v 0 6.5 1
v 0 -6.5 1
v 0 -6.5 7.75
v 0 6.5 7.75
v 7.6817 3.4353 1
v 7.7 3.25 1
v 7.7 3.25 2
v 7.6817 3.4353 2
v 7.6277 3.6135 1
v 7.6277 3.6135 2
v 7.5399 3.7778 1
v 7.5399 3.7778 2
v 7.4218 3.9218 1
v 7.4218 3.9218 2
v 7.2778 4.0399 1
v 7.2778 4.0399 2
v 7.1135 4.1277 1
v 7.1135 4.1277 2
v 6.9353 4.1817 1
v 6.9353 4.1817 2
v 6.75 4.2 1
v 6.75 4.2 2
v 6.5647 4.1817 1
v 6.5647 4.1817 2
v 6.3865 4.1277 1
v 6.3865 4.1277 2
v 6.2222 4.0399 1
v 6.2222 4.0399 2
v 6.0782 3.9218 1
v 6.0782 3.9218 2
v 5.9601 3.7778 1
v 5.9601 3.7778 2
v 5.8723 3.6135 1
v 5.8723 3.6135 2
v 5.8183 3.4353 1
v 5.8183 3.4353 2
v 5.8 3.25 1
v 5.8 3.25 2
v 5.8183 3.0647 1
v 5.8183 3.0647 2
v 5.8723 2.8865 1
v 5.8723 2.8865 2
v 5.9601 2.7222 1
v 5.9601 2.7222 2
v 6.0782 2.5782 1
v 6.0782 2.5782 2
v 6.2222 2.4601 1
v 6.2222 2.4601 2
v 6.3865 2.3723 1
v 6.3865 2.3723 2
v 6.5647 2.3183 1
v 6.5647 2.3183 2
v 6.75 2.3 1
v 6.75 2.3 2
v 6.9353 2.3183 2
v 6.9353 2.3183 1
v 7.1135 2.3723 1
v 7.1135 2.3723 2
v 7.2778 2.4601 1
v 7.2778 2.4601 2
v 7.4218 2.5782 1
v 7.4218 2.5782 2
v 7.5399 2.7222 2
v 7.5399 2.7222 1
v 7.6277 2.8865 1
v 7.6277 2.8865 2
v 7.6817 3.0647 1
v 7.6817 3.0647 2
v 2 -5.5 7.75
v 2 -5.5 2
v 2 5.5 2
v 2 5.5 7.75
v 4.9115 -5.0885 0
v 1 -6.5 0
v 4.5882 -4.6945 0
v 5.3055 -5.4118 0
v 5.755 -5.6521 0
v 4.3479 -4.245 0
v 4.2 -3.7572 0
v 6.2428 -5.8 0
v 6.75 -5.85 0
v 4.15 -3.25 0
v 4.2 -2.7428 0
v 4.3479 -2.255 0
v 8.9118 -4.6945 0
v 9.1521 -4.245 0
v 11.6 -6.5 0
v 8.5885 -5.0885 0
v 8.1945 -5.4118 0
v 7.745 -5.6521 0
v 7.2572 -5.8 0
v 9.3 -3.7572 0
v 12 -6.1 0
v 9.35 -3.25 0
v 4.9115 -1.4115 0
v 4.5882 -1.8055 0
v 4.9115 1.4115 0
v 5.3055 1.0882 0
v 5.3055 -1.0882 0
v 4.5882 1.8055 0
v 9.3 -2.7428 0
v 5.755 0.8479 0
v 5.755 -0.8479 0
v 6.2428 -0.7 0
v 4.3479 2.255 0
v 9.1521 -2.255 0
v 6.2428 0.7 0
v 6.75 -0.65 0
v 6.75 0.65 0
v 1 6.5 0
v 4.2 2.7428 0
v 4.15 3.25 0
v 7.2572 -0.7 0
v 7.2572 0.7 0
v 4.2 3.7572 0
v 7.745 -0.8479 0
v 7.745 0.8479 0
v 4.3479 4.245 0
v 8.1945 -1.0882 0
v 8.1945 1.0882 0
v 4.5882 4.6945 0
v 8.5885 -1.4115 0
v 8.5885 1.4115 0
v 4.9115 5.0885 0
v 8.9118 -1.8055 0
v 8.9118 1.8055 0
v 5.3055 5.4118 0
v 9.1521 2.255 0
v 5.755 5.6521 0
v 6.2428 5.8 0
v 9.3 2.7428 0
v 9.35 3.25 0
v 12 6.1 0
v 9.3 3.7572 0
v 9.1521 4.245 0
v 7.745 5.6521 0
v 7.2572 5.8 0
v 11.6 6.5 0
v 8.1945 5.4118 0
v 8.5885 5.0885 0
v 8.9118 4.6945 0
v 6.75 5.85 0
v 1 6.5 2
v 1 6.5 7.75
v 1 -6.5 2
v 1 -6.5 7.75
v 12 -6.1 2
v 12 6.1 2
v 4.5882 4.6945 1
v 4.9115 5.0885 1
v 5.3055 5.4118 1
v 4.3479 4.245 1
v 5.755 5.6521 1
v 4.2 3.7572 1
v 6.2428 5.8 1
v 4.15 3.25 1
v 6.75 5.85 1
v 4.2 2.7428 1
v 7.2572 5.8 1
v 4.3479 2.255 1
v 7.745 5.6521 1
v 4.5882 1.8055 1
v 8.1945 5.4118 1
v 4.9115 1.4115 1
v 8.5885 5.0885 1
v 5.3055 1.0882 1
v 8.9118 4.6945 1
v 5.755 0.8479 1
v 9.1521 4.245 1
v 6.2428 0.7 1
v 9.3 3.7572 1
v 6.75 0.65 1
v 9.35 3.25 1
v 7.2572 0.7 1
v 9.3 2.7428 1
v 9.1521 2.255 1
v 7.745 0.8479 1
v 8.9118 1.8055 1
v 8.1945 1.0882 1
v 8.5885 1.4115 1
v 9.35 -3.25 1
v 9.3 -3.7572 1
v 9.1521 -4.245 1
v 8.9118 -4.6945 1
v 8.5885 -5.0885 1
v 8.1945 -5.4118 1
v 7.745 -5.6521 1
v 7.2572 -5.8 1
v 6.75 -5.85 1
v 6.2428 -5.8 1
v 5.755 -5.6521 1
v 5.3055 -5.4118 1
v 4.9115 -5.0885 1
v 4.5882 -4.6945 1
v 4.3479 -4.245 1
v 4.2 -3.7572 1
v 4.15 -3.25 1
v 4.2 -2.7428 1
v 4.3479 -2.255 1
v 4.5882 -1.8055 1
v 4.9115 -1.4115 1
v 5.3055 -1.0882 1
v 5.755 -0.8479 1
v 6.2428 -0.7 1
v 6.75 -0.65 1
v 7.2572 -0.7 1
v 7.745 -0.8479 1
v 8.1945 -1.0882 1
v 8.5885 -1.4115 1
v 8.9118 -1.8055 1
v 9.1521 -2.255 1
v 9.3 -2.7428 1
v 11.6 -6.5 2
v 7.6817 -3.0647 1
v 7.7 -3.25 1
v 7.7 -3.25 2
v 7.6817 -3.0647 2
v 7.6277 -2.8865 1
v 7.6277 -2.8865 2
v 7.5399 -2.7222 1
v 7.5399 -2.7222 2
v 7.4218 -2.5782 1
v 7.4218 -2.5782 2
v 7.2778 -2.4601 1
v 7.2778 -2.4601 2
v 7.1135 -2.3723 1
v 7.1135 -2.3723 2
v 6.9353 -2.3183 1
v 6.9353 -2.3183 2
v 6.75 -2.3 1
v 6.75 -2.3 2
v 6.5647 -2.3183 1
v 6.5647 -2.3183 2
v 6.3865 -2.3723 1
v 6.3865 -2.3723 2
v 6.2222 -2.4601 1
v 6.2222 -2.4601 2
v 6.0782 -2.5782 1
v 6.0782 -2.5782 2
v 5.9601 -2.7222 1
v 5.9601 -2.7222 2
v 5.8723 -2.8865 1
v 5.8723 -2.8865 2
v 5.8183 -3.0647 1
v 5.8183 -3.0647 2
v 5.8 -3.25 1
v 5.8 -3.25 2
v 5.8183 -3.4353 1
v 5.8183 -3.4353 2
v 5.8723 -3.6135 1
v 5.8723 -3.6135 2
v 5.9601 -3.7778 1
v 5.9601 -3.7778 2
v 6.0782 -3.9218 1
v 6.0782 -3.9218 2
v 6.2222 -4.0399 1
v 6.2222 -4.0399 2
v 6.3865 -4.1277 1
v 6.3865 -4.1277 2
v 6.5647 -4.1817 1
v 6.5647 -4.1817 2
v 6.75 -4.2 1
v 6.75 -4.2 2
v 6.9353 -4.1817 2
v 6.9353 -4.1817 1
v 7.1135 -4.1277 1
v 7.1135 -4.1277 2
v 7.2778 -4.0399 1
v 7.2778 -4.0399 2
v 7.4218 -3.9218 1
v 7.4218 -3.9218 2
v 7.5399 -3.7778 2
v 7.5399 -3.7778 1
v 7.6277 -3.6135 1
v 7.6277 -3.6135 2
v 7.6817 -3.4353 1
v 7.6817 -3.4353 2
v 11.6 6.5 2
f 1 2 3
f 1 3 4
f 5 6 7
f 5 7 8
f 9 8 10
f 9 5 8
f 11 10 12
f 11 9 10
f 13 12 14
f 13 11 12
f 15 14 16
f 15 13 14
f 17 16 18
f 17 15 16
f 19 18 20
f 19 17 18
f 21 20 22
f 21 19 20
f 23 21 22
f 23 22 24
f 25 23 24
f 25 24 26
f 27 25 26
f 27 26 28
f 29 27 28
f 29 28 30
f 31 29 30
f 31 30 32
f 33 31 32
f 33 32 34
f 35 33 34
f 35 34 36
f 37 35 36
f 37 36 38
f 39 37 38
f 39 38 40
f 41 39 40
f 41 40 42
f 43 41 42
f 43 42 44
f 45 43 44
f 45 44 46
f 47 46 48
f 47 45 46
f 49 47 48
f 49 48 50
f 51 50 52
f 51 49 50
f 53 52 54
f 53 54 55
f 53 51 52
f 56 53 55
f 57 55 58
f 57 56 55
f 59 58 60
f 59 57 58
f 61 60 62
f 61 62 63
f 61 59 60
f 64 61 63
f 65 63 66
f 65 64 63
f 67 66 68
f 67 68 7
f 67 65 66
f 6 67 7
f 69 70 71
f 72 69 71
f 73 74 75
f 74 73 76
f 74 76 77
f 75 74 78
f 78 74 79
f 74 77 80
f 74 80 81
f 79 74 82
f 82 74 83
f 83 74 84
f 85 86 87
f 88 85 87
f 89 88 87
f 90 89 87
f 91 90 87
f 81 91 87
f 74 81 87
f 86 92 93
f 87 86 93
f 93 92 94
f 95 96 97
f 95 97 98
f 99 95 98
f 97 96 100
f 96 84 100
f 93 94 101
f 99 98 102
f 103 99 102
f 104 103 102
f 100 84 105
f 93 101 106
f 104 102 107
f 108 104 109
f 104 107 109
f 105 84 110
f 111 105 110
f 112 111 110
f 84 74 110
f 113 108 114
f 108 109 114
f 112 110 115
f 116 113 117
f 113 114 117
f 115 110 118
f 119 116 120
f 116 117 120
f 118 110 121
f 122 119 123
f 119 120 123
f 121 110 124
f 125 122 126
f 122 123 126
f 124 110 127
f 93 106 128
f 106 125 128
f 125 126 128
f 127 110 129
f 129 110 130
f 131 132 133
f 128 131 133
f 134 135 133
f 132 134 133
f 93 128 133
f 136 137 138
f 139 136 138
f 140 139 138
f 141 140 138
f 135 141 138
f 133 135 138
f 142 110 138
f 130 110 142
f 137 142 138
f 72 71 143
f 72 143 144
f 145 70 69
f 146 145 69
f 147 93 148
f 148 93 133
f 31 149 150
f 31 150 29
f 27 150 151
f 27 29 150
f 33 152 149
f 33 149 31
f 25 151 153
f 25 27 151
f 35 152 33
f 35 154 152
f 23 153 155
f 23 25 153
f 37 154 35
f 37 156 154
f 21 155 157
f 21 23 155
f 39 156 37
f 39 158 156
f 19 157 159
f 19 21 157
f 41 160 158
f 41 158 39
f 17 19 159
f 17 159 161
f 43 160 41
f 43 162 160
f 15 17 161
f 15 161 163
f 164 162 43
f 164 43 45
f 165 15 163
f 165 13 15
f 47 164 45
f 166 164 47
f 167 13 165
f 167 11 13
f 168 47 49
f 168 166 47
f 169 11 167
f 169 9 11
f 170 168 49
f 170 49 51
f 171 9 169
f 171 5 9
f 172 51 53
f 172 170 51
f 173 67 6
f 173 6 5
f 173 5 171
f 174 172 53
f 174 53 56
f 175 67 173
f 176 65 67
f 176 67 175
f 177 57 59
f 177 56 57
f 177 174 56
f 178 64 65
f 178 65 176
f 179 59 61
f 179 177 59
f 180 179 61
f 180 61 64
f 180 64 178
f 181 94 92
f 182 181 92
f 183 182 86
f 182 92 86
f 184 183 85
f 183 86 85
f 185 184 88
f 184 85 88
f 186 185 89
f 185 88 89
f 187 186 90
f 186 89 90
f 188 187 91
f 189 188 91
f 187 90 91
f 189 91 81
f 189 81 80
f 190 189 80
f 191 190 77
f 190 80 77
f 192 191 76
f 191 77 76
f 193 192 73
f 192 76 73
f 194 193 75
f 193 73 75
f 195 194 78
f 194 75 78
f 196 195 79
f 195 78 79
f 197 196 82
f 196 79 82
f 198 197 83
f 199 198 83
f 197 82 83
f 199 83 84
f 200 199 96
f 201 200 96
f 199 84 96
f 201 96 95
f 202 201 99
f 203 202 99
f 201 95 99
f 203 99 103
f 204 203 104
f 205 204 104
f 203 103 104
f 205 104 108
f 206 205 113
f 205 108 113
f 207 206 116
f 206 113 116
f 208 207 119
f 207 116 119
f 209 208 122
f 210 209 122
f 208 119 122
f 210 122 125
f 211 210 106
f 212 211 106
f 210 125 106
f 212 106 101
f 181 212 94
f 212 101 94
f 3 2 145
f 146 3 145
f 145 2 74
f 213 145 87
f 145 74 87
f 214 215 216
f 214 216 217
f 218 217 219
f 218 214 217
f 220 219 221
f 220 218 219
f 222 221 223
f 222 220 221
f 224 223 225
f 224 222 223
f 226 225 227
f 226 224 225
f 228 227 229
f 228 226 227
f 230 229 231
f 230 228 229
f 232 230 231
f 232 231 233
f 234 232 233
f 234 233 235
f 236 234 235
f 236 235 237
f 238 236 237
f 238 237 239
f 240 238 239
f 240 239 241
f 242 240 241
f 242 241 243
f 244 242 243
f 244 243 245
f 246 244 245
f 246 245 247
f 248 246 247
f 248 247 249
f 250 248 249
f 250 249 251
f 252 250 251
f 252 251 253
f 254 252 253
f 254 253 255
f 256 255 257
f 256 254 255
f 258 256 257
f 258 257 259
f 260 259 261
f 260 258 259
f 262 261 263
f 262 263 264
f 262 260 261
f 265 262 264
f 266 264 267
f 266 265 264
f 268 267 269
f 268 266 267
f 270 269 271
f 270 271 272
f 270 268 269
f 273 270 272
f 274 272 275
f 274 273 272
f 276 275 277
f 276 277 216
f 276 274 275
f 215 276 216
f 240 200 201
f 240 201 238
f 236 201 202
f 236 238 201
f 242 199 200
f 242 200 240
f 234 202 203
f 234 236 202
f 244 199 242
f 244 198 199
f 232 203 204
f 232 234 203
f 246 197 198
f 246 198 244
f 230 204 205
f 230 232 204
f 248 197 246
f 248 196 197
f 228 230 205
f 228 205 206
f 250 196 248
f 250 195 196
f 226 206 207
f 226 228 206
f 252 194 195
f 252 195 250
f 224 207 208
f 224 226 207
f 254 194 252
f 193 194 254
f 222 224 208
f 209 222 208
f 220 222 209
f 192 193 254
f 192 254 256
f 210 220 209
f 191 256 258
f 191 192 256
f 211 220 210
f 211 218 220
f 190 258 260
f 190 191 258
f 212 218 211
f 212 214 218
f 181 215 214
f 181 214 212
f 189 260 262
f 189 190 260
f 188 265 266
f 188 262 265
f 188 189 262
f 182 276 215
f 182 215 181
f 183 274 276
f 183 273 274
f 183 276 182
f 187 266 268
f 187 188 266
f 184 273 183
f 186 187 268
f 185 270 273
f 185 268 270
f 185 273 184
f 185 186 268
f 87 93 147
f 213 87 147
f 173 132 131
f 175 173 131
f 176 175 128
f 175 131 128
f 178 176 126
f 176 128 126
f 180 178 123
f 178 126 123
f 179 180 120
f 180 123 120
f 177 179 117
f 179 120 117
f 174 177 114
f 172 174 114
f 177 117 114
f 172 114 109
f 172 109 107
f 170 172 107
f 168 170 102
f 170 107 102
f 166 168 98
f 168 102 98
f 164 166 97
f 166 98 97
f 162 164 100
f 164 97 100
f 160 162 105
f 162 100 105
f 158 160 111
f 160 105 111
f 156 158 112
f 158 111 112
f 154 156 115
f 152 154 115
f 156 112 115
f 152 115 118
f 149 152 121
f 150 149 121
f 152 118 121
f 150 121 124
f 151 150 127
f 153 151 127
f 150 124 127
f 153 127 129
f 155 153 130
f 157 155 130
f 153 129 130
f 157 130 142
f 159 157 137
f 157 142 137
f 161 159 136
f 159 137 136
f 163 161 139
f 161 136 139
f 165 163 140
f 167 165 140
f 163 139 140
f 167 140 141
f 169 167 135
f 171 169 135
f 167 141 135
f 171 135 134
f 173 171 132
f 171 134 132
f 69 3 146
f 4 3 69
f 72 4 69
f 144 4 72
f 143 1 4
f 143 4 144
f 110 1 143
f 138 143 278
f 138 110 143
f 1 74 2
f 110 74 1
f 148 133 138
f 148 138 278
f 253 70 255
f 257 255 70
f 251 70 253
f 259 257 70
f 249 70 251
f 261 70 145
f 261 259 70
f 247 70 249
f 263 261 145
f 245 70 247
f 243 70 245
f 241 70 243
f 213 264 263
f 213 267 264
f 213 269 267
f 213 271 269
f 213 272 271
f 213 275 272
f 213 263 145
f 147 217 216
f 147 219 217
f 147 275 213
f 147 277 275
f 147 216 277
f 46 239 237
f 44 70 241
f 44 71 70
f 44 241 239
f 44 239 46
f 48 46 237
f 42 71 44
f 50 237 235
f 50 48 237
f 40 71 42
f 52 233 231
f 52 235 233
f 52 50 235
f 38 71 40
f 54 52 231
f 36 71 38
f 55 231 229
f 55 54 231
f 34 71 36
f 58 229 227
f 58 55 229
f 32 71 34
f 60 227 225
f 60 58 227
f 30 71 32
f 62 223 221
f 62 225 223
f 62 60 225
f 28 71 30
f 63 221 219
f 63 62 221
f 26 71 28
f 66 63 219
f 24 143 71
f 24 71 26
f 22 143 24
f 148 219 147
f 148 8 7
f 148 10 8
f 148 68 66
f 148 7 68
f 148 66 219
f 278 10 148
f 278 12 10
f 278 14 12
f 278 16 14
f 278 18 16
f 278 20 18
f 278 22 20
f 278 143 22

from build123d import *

# Parameters (mm, degrees)
SKETCH002_W                                = 12
SKETCH002_H                                = 13
SKETCH002_R                                = 0.95
PAD001007_DEPTH                            = 2
SKETCH003_W                                = 2
SKETCH003_H                                = 13
PAD002_DEPTH                               = 5.75
SKETCH004_R                                = 2.6
POCKET001_DEPTH                            = 1
CHAMFER005021077002006007019003032014_SIZE = 1
CHAMFER001_SIZE                            = 1
CHAMFER002_SIZE                            = 0.4


with BuildPart() as part:
    # Sketch002 → Pad001007 (new body)
    with BuildSketch(Plane.XY):
        with Locations((6, 0)):
            Rectangle(SKETCH002_W, SKETCH002_H)
        with Locations((6.75, 3.25)):
            Circle(SKETCH002_R, mode=Mode.SUBTRACT)
        with Locations((6.75, -3.25)):
            Circle(SKETCH002_R, mode=Mode.SUBTRACT)
    extrude(amount=PAD001007_DEPTH)

    # Sketch003 (on Face8 of Pad001007) → Pad002 (join)
    with BuildSketch(Plane.XY.offset(2)):
        with Locations((1, 0)):
            Rectangle(SKETCH003_W, SKETCH003_H)
    extrude(amount=PAD002_DEPTH)

    # Sketch004 (on Face4 of Pad002) → Pocket001 (cut)
    with BuildSketch(Plane(origin=(0, 0, 0), x_dir=(1, 0, 0), z_dir=(0, 0, -1))):
        with Locations((6.75, 3.25)):
            Circle(SKETCH004_R)
        with Locations((6.75, -3.25)):
            Circle(SKETCH004_R)
    extrude(amount=-POCKET001_DEPTH, mode=Mode.SUBTRACT)

    # Chamfer005021077002006007019003032014
    chamfer005021077002006007019003032014_edges = [part.edges().sort_by_distance(p)[0] for p in [
        (0, 0, 0),
    ]]
    chamfer(chamfer005021077002006007019003032014_edges, length=CHAMFER005021077002006007019003032014_SIZE)

    # Chamfer001
    chamfer001_edges = [part.edges().sort_by_distance(p)[0] for p in [
        (2, 6.5, 4.875),
        (2, -6.5, 4.875),
    ]]
    chamfer(chamfer001_edges, length=CHAMFER001_SIZE)

    # Chamfer002
    chamfer002_edges = [part.edges().sort_by_distance(p)[0] for p in [
        (12, 6.5, 1),
        (12, -6.5, 1),
    ]]
    chamfer(chamfer002_edges, length=CHAMFER002_SIZE)


solid = part.part
